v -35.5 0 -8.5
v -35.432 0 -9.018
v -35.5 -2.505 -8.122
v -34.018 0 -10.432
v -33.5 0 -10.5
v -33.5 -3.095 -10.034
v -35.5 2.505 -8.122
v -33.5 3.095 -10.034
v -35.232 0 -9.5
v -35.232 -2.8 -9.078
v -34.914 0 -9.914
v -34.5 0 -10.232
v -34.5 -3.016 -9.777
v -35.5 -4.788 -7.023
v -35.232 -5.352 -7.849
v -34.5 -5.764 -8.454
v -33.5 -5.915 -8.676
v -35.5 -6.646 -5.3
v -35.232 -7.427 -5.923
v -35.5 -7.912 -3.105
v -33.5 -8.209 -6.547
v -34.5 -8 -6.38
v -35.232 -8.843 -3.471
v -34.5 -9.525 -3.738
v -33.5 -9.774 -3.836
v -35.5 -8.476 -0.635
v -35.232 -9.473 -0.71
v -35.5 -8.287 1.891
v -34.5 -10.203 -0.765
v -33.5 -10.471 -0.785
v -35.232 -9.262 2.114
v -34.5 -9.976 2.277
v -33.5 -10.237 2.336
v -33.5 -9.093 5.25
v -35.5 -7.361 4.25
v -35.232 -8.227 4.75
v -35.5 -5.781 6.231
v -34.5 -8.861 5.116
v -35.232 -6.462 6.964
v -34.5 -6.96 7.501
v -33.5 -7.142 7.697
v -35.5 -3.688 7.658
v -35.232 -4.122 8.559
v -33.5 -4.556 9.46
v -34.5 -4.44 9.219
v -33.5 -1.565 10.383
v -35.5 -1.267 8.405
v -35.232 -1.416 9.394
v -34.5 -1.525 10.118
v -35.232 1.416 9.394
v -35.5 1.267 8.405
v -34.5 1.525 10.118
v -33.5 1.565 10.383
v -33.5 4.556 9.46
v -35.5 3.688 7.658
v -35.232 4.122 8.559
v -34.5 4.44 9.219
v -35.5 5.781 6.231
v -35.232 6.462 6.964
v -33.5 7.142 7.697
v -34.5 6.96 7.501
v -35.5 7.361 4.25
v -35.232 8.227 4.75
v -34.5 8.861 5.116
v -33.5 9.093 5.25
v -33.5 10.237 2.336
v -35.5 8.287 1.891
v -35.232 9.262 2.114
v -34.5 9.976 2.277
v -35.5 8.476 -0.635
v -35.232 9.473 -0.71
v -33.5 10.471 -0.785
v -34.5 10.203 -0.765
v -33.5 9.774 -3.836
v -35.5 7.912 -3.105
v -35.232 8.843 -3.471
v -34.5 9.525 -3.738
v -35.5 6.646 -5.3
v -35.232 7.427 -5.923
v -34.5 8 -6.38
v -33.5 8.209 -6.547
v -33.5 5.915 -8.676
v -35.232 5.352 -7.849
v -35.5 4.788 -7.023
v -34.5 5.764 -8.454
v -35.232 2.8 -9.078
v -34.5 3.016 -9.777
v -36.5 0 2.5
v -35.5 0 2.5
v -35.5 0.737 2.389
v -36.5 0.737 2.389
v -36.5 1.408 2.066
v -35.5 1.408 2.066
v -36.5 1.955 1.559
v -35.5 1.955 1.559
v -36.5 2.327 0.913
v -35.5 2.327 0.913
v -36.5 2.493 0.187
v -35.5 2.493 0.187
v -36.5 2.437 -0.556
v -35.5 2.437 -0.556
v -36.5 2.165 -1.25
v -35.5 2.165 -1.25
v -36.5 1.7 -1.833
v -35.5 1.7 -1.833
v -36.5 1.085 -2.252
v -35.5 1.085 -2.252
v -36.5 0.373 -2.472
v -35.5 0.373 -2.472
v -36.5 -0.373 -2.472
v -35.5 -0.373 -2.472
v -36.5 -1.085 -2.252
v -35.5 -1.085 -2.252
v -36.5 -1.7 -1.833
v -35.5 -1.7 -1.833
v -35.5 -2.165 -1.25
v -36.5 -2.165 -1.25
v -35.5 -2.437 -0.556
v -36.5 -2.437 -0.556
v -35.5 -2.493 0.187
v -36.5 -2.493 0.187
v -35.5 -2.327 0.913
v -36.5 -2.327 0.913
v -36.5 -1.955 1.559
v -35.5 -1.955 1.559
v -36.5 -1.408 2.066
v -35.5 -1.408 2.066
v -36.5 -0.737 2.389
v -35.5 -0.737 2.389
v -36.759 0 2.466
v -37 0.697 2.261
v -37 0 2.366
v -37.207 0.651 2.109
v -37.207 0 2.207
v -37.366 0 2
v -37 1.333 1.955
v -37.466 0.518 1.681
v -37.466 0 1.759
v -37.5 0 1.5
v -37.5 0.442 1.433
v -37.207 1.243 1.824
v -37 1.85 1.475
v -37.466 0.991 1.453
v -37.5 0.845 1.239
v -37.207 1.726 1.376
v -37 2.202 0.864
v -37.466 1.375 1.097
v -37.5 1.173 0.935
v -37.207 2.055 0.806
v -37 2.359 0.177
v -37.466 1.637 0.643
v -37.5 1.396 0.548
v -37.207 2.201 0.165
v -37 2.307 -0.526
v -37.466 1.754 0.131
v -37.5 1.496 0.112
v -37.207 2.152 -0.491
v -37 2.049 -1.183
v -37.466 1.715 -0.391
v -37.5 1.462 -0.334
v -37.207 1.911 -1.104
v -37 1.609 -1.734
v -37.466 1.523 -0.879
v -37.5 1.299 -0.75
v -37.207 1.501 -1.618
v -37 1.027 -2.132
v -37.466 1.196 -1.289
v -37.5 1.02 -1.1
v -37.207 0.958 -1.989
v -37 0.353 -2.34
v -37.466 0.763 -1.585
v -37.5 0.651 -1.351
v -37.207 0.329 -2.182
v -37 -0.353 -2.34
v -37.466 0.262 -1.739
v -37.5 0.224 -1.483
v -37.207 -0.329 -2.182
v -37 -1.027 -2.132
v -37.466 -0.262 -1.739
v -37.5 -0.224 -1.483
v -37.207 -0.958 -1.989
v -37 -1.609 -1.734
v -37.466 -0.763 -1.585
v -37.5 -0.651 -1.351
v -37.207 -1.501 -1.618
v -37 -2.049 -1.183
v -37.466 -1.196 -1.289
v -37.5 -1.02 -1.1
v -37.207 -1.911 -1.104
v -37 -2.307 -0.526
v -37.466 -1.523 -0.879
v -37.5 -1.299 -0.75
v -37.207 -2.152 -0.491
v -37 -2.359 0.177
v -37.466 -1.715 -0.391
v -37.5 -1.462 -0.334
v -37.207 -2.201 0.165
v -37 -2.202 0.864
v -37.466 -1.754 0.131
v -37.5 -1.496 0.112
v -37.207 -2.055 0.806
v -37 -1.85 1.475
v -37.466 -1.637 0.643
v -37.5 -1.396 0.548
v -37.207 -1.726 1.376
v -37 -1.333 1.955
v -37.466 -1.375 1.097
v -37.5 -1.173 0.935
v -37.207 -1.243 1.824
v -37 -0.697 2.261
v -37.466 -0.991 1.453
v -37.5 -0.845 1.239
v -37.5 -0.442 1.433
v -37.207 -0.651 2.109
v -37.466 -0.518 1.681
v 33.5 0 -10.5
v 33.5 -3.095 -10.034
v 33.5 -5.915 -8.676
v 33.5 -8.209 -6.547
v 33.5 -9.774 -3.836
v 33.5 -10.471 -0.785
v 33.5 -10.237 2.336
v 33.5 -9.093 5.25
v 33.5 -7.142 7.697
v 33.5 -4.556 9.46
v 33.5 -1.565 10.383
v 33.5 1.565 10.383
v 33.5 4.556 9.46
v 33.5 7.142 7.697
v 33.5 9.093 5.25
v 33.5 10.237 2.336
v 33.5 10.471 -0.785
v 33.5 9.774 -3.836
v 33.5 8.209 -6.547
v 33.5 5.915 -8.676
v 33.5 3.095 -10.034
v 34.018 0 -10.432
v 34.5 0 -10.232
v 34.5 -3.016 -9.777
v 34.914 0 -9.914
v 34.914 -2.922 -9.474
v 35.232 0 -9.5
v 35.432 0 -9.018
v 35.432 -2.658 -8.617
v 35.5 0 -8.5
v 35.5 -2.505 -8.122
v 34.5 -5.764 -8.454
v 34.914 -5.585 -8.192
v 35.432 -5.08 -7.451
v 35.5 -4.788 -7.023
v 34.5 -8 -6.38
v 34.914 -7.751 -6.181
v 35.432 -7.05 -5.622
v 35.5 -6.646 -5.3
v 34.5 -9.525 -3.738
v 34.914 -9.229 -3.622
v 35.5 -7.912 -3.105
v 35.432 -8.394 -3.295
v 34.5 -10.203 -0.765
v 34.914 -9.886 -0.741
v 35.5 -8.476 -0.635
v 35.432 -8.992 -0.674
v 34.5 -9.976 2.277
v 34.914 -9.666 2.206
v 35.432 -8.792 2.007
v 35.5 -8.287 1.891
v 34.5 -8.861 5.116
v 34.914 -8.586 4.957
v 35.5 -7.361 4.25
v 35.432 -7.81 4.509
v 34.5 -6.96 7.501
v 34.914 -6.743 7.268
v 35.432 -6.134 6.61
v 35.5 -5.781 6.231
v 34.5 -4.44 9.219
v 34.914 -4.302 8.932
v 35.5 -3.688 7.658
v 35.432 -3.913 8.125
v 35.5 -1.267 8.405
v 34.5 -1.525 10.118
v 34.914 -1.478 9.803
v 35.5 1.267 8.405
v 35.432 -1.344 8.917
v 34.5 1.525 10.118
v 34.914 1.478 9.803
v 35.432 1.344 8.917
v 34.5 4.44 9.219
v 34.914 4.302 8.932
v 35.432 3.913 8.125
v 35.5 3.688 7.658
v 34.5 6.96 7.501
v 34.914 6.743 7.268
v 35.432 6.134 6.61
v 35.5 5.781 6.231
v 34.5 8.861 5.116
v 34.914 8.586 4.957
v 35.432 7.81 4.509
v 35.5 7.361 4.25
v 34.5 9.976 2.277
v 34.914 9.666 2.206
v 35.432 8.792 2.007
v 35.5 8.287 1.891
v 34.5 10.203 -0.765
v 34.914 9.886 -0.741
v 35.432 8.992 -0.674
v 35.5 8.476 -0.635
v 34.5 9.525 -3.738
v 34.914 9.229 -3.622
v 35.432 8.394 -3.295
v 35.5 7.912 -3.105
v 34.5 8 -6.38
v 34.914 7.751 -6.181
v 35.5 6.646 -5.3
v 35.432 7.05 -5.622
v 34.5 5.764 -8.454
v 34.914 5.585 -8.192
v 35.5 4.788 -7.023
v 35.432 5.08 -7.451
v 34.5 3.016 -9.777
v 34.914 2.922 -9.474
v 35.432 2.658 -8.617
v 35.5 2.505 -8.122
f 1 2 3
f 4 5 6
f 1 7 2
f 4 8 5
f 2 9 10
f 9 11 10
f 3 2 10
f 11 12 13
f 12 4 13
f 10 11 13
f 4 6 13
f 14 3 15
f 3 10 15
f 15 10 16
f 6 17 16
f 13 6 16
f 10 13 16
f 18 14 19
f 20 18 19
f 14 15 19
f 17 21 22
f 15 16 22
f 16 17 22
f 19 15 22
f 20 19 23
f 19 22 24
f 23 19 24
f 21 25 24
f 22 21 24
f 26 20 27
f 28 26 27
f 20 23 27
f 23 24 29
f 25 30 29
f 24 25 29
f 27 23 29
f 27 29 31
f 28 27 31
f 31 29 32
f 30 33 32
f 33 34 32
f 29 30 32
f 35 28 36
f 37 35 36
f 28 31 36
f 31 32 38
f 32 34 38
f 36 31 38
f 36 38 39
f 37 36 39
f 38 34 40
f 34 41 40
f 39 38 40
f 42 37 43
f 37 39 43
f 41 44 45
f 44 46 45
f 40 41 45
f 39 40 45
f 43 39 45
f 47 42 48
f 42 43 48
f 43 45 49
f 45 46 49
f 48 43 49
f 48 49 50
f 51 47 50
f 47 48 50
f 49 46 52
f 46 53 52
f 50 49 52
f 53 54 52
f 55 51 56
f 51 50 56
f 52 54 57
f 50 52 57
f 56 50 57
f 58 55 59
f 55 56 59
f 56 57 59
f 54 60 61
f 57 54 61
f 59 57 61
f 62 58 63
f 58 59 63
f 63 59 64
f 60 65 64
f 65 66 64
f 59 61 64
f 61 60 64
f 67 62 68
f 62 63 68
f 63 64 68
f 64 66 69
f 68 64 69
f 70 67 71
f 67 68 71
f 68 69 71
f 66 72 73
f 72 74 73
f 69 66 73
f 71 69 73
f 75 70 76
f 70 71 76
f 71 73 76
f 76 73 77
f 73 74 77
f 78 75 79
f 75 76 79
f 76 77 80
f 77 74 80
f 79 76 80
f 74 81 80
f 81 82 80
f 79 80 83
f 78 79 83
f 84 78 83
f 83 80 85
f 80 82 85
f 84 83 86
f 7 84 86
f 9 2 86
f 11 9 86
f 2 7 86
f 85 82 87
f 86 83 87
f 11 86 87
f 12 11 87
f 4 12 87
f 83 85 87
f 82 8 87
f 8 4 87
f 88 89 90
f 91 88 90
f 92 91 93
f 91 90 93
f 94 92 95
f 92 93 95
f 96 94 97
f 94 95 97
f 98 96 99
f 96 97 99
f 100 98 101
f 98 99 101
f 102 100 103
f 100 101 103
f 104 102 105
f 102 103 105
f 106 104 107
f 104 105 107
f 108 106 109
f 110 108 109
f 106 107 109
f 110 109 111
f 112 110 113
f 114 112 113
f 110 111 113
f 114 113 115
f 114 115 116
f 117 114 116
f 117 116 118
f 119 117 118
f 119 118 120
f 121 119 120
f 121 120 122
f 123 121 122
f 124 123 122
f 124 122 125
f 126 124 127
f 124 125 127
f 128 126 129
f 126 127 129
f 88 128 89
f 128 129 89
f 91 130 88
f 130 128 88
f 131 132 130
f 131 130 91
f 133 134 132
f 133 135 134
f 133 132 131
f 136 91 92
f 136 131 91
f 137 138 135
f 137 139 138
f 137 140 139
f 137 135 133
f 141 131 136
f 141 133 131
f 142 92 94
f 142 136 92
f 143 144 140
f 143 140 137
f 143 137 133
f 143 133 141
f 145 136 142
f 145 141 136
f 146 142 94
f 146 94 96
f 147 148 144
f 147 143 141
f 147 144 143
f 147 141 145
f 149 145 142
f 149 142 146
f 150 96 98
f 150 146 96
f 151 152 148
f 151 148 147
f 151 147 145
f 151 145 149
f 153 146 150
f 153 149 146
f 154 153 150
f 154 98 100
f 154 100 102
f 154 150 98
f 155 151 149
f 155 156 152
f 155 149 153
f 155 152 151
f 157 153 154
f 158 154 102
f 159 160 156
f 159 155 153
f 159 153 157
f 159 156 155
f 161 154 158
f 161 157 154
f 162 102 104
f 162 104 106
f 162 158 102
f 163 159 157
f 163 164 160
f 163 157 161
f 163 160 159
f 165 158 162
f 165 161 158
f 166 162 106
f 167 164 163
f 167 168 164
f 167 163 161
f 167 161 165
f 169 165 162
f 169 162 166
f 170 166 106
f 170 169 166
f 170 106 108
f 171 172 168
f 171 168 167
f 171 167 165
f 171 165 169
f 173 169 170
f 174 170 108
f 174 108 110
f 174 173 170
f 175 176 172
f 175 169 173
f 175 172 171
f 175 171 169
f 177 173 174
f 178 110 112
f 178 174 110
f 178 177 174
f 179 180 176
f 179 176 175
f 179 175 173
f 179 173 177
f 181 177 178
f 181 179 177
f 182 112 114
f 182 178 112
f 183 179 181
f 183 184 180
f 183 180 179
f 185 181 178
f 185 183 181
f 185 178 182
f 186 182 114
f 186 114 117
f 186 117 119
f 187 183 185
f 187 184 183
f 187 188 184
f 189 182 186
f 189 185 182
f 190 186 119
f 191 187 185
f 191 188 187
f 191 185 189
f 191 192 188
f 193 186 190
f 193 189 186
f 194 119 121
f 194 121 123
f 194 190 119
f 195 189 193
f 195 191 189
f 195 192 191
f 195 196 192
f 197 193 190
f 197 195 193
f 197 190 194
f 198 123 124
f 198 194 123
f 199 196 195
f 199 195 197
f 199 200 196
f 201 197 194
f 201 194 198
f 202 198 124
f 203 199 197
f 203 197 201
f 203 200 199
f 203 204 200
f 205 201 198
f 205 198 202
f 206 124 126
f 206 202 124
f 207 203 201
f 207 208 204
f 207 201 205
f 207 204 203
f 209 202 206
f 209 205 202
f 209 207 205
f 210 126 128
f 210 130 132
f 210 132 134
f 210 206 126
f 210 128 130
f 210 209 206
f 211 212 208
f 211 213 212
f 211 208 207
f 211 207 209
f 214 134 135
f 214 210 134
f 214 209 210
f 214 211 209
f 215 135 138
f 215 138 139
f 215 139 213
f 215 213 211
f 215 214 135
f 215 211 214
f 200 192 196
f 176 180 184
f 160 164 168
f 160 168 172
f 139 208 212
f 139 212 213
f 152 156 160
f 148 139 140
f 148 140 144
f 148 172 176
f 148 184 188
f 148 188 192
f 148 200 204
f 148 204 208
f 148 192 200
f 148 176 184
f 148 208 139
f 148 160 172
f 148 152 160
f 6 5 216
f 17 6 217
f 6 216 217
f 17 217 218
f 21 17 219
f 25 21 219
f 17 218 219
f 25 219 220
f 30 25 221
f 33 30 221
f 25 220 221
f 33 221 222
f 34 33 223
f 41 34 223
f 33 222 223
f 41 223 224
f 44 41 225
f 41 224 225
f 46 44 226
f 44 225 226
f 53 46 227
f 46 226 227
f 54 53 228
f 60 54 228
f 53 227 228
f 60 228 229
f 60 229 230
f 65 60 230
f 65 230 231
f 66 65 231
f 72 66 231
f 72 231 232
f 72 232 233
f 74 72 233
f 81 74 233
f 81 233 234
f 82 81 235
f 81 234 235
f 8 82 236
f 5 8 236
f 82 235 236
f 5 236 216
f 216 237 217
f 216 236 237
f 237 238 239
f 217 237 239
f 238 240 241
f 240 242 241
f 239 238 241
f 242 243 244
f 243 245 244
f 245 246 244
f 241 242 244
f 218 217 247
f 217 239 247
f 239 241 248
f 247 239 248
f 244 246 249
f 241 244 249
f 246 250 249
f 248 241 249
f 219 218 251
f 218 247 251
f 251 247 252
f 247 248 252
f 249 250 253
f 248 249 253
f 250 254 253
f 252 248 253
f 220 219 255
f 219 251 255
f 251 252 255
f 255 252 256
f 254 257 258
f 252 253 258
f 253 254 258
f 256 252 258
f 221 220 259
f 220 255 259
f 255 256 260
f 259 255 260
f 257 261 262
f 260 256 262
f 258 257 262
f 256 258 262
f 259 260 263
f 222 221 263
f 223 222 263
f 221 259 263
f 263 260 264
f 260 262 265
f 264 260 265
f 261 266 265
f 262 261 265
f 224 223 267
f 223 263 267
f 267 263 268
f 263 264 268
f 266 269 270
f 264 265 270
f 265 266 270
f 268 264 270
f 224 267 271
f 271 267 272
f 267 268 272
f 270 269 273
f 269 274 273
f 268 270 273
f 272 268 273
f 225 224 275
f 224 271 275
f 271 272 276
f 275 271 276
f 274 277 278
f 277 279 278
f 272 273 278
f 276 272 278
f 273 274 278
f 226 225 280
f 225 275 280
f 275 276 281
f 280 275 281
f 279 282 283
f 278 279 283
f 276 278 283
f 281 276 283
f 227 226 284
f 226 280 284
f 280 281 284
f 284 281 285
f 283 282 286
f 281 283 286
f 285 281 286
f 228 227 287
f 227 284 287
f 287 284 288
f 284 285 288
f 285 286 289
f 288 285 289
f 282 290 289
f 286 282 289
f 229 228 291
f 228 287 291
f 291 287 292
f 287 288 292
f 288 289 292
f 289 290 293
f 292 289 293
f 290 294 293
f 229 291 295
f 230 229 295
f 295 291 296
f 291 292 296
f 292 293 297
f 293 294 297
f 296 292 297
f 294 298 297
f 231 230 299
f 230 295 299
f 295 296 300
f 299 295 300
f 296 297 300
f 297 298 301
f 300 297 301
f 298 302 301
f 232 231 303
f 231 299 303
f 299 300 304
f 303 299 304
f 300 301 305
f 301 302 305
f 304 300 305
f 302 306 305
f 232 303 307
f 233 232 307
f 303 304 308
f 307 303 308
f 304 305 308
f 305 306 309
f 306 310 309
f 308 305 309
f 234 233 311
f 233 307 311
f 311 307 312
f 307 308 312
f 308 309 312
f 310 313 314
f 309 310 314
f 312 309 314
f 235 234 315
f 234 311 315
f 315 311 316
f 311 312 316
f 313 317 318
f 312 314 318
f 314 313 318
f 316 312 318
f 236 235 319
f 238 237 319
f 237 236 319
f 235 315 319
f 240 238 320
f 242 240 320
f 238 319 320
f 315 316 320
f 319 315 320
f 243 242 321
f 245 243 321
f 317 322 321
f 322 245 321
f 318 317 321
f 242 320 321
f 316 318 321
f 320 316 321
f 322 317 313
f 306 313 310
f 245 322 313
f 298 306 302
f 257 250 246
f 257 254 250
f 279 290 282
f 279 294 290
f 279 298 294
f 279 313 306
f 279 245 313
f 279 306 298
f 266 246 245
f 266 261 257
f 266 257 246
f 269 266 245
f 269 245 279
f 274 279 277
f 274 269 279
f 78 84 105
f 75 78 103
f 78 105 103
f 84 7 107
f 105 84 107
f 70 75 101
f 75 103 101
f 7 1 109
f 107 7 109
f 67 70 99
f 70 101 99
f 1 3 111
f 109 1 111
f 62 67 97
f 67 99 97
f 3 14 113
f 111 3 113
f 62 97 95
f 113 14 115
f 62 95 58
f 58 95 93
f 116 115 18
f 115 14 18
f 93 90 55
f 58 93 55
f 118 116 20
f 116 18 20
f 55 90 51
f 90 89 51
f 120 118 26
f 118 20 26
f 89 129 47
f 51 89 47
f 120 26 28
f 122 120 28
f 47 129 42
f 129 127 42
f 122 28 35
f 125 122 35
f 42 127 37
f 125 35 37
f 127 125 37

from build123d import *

# Parameters (mm, degrees)
SKETCH_1_W      = 71
SKETCH_1_H      = 10.5
FILLET_1_R      = 2
FILLET_2_R      = 2
SKETCH_2_R      = 2.5
EXTRUDE_1_DEPTH = 2
FILLET_3_R      = 1


with BuildPart() as part:
    # 草图1 → 旋转3 (revolve)
    with BuildSketch(Plane(origin=(0, 0, 0), x_dir=(1, 0, 0), z_dir=(0, 1, 0))):
        with Locations((0, 5.25)):
            Rectangle(SKETCH_1_W, SKETCH_1_H)
    revolve(axis=Axis((35.5, 0, 0), (-1, 0, 0)))

    # 圆角1
    fillet_1_edges = [part.edges().sort_by_distance(p)[0] for p in [
        (-35.5, 0, 10.5),
    ]]
    fillet(fillet_1_edges, radius=FILLET_1_R)

    # 圆角2
    fillet_2_edges = [part.edges().sort_by_distance(p)[0] for p in [
        (35.5, 0, 10.5),
    ]]
    fillet(fillet_2_edges, radius=FILLET_2_R)

    # 草图2 → 凸台-拉伸1 (add)
    with BuildSketch(Plane.ZY.offset(35.5)):
        Circle(SKETCH_2_R)
    extrude(amount=EXTRUDE_1_DEPTH)

    # 圆角3
    fillet_3_edges = [part.edges().sort_by_distance(p)[0] for p in [
        (-37.5, 0, -2.5),
    ]]
    fillet(fillet_3_edges, radius=FILLET_3_R)


solid = part.part
